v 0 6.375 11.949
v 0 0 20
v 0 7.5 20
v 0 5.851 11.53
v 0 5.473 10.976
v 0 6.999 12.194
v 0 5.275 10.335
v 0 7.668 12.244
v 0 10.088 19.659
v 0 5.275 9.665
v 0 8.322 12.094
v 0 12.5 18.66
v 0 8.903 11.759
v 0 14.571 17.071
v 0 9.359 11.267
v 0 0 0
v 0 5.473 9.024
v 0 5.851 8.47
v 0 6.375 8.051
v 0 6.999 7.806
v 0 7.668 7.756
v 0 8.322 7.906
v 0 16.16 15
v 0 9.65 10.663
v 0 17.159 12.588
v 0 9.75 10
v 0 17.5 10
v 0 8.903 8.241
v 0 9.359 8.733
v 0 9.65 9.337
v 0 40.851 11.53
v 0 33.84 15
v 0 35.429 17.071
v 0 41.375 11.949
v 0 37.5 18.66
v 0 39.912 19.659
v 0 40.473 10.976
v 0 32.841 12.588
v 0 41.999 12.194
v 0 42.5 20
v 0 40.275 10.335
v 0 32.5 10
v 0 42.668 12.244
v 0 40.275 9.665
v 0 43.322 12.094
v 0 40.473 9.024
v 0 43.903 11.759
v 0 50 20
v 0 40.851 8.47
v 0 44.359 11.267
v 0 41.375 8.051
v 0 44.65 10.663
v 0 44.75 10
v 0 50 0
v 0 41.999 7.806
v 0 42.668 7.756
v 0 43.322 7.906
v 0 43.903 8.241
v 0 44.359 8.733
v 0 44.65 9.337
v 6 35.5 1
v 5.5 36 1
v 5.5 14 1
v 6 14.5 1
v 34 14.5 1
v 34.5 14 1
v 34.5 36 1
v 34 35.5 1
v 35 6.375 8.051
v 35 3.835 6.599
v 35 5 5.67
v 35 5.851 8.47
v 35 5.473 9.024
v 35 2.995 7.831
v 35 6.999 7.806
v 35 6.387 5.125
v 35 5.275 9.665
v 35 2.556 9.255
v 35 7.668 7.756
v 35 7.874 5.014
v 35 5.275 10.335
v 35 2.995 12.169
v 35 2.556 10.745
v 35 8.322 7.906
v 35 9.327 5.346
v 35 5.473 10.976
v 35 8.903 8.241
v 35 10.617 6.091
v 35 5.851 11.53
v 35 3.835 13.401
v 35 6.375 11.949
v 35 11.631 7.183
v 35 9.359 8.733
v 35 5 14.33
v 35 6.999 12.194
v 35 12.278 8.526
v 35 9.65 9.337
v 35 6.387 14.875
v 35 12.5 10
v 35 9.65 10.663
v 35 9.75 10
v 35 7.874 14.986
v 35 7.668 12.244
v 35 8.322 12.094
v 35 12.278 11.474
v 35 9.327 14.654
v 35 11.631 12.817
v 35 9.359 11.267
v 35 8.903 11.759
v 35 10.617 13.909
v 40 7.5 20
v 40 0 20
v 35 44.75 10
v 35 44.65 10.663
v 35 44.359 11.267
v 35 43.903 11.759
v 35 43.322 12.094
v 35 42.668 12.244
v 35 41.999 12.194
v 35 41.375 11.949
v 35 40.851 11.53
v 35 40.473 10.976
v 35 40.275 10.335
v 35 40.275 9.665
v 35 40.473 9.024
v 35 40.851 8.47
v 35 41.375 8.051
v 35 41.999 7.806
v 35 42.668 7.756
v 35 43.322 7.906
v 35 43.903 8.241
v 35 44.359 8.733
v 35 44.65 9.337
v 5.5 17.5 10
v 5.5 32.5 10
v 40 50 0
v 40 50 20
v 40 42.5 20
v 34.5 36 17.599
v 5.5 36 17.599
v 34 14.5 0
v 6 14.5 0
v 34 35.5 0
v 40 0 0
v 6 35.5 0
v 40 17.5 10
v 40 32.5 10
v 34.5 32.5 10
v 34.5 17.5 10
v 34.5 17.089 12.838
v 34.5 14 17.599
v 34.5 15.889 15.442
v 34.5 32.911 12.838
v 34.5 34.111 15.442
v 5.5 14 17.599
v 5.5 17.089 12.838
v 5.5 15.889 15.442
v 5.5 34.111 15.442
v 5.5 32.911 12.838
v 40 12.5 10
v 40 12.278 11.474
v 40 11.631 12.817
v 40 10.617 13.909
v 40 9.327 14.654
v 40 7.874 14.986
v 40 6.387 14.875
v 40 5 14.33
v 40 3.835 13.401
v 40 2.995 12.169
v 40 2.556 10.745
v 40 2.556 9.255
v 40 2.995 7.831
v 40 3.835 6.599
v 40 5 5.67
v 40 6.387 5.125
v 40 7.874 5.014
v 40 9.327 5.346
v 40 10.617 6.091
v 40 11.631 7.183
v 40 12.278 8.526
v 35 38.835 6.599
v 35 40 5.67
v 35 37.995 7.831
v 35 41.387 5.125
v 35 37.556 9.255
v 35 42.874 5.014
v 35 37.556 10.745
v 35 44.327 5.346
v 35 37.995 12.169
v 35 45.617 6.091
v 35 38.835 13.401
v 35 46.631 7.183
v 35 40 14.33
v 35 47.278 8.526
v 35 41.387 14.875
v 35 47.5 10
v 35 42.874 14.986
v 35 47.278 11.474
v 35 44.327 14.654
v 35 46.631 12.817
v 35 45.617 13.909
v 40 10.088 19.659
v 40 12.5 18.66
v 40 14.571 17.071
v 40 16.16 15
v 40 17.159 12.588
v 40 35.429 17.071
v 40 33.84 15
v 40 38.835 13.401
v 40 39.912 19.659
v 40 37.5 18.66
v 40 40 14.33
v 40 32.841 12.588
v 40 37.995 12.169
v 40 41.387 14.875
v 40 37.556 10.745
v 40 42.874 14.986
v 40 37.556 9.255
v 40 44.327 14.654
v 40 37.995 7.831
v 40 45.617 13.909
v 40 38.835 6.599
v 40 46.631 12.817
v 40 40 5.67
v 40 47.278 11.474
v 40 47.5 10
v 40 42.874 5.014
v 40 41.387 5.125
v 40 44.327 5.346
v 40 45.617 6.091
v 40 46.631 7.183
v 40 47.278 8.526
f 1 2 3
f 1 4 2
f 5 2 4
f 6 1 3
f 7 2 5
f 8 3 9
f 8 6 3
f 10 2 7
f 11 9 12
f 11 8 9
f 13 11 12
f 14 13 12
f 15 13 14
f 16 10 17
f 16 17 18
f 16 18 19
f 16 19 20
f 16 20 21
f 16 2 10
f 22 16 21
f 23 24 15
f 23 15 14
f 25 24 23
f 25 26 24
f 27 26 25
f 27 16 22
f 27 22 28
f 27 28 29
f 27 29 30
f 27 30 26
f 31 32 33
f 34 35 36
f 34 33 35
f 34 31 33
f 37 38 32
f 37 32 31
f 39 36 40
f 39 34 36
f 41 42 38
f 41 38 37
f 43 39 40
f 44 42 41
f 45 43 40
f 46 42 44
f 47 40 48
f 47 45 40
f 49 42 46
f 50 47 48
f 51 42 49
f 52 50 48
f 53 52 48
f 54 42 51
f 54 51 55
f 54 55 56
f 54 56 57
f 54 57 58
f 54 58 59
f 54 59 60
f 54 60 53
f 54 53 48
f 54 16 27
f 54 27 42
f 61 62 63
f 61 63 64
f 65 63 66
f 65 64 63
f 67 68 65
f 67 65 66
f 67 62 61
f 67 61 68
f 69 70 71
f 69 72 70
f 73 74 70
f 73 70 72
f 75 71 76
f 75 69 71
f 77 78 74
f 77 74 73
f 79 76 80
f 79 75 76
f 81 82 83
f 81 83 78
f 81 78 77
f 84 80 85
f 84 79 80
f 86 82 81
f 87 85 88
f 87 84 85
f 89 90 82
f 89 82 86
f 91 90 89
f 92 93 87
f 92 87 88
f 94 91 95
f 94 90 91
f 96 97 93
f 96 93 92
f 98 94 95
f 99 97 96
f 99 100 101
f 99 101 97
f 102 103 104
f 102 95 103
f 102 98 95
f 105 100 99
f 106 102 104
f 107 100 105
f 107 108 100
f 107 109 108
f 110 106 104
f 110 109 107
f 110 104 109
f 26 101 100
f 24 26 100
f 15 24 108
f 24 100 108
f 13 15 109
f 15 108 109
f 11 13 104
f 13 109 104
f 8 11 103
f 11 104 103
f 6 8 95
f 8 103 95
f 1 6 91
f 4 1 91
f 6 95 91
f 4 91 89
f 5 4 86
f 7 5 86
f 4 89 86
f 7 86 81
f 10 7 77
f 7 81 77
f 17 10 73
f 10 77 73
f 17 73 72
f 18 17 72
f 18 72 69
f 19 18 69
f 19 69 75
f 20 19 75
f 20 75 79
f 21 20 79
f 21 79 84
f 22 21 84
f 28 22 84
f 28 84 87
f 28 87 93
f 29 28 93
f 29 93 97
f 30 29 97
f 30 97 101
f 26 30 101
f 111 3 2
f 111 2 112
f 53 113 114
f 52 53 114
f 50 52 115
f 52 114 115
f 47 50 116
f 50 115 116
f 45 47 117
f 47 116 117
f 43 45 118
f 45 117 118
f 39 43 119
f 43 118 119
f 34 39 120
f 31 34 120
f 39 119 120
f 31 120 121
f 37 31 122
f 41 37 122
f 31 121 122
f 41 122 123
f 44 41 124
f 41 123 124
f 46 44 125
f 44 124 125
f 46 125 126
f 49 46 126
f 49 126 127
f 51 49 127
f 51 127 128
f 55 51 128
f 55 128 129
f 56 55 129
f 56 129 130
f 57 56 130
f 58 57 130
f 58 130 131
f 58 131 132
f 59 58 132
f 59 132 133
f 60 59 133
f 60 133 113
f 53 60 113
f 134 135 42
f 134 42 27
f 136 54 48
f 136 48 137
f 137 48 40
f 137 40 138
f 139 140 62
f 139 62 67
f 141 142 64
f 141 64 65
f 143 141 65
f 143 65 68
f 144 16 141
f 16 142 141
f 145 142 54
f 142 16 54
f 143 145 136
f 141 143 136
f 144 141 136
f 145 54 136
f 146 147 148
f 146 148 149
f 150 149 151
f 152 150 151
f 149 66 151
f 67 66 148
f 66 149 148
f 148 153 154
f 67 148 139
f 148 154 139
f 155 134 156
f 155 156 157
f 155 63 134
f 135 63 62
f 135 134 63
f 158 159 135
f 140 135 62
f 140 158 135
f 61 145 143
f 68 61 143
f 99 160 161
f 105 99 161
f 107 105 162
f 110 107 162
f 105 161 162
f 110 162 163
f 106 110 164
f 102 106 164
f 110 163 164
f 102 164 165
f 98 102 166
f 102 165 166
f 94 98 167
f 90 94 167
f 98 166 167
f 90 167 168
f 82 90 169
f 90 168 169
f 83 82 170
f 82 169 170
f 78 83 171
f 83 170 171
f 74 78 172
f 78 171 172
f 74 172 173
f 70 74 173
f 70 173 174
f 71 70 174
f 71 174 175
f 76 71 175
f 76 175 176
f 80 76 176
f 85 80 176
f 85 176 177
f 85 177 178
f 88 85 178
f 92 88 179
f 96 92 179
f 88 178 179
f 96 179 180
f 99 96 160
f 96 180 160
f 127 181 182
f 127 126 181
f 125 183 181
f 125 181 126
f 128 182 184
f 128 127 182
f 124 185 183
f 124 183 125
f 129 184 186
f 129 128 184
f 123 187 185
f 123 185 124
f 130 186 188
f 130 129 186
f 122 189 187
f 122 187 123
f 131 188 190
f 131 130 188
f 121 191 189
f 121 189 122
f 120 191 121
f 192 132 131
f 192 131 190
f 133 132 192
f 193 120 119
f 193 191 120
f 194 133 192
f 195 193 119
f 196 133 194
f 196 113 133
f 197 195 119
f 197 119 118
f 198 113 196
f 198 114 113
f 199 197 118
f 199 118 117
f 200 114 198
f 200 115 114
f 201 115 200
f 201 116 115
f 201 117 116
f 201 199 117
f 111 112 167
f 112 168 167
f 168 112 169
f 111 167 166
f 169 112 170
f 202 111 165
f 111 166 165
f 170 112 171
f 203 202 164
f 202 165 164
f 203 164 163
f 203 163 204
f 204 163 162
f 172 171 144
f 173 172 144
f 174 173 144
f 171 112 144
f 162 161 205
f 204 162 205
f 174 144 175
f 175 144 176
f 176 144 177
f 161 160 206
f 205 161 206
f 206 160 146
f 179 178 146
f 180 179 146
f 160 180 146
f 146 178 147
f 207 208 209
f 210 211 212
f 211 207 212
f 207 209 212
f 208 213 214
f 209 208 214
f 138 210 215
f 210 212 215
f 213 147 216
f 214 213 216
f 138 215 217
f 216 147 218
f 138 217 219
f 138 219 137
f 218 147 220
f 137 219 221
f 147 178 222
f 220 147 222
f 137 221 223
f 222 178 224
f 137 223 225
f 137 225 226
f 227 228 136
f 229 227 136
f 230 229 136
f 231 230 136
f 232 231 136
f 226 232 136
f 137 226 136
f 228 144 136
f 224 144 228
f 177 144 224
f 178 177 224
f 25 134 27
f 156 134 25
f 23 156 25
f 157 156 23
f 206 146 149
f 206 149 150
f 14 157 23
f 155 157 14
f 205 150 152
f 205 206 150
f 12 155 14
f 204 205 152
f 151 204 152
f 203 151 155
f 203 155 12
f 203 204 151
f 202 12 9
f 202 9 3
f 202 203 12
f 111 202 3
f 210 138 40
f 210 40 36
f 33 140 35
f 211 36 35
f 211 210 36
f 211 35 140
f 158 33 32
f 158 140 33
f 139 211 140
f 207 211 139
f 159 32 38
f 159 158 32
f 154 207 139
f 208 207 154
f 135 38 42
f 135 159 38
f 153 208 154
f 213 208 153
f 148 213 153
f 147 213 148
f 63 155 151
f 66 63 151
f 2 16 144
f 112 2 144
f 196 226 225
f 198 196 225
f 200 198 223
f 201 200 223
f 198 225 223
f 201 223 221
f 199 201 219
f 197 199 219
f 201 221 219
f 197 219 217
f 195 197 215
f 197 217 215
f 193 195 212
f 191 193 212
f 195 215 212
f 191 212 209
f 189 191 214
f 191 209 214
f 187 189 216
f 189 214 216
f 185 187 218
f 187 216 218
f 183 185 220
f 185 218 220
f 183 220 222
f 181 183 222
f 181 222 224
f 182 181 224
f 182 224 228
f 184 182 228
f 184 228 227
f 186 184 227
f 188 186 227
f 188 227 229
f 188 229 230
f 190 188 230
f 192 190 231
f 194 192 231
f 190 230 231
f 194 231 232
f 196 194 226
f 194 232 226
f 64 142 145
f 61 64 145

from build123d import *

# Parameters (mm, degrees)
SKETCH_W        = 40
SKETCH_H        = 50
SKETCH_W_2      = 28
SKETCH_H_2      = 21
PAD_DEPTH       = 20
SKETCH001_R     = 2.25
POCKET_DEPTH    = 40.001
SKETCH002_W     = 29
SKETCH002_H     = 22
POCKET001_DEPTH = 19
SKETCH003_R     = 5
POCKET002_DEPTH = 5
POCKET003_DEPTH = 40.001


with BuildPart() as part:
    # Sketch → Pad (new body)
    with BuildSketch(Plane.XY):
        with Locations((20, 25)):
            Rectangle(SKETCH_W, SKETCH_H)
        with Locations((20, 25)):
            Rectangle(SKETCH_W_2, SKETCH_H_2, mode=Mode.SUBTRACT)
    extrude(amount=PAD_DEPTH)

    # Sketch001 → Pocket (cut, through all)
    with BuildSketch(Plane.YZ.offset(40)):
        with Locations((7.5, 10)):
            Circle(SKETCH001_R)
        with Locations((42.5, 10)):
            Circle(SKETCH001_R)
    extrude(amount=-POCKET_DEPTH, mode=Mode.SUBTRACT)

    # Sketch002 → Pocket001 (cut)
    with BuildSketch(Plane.XY.offset(20)):
        with Locations((20, 25)):
            Rectangle(SKETCH002_W, SKETCH002_H)
    extrude(amount=-POCKET001_DEPTH, mode=Mode.SUBTRACT)

    # Sketch003 → Pocket002 (cut)
    with BuildSketch(Plane.YZ.offset(40)):
        with Locations((7.5, 10)):
            Circle(SKETCH003_R)
        with Locations((42.5, 10)):
            Circle(SKETCH003_R)
    extrude(amount=-POCKET002_DEPTH, mode=Mode.SUBTRACT)

    # Sketch004 → Pocket003 (cut, through all)
    with BuildSketch(Plane.YZ.offset(40)):
        with BuildLine():
            ThreePointArc((17.5, 10), (14.571068, 17.071068), (7.5, 20))
            Line((7.5, 20), (7.5, 22))
            Line((7.5, 22), (42.5, 22))
            Line((42.5, 22), (42.5, 20))
            ThreePointArc((42.5, 20), (35.428932, 17.071068), (32.5, 10))
            Line((32.5, 10), (17.5, 10))
        make_face()
    extrude(amount=-POCKET003_DEPTH, mode=Mode.SUBTRACT)


solid = part.part
